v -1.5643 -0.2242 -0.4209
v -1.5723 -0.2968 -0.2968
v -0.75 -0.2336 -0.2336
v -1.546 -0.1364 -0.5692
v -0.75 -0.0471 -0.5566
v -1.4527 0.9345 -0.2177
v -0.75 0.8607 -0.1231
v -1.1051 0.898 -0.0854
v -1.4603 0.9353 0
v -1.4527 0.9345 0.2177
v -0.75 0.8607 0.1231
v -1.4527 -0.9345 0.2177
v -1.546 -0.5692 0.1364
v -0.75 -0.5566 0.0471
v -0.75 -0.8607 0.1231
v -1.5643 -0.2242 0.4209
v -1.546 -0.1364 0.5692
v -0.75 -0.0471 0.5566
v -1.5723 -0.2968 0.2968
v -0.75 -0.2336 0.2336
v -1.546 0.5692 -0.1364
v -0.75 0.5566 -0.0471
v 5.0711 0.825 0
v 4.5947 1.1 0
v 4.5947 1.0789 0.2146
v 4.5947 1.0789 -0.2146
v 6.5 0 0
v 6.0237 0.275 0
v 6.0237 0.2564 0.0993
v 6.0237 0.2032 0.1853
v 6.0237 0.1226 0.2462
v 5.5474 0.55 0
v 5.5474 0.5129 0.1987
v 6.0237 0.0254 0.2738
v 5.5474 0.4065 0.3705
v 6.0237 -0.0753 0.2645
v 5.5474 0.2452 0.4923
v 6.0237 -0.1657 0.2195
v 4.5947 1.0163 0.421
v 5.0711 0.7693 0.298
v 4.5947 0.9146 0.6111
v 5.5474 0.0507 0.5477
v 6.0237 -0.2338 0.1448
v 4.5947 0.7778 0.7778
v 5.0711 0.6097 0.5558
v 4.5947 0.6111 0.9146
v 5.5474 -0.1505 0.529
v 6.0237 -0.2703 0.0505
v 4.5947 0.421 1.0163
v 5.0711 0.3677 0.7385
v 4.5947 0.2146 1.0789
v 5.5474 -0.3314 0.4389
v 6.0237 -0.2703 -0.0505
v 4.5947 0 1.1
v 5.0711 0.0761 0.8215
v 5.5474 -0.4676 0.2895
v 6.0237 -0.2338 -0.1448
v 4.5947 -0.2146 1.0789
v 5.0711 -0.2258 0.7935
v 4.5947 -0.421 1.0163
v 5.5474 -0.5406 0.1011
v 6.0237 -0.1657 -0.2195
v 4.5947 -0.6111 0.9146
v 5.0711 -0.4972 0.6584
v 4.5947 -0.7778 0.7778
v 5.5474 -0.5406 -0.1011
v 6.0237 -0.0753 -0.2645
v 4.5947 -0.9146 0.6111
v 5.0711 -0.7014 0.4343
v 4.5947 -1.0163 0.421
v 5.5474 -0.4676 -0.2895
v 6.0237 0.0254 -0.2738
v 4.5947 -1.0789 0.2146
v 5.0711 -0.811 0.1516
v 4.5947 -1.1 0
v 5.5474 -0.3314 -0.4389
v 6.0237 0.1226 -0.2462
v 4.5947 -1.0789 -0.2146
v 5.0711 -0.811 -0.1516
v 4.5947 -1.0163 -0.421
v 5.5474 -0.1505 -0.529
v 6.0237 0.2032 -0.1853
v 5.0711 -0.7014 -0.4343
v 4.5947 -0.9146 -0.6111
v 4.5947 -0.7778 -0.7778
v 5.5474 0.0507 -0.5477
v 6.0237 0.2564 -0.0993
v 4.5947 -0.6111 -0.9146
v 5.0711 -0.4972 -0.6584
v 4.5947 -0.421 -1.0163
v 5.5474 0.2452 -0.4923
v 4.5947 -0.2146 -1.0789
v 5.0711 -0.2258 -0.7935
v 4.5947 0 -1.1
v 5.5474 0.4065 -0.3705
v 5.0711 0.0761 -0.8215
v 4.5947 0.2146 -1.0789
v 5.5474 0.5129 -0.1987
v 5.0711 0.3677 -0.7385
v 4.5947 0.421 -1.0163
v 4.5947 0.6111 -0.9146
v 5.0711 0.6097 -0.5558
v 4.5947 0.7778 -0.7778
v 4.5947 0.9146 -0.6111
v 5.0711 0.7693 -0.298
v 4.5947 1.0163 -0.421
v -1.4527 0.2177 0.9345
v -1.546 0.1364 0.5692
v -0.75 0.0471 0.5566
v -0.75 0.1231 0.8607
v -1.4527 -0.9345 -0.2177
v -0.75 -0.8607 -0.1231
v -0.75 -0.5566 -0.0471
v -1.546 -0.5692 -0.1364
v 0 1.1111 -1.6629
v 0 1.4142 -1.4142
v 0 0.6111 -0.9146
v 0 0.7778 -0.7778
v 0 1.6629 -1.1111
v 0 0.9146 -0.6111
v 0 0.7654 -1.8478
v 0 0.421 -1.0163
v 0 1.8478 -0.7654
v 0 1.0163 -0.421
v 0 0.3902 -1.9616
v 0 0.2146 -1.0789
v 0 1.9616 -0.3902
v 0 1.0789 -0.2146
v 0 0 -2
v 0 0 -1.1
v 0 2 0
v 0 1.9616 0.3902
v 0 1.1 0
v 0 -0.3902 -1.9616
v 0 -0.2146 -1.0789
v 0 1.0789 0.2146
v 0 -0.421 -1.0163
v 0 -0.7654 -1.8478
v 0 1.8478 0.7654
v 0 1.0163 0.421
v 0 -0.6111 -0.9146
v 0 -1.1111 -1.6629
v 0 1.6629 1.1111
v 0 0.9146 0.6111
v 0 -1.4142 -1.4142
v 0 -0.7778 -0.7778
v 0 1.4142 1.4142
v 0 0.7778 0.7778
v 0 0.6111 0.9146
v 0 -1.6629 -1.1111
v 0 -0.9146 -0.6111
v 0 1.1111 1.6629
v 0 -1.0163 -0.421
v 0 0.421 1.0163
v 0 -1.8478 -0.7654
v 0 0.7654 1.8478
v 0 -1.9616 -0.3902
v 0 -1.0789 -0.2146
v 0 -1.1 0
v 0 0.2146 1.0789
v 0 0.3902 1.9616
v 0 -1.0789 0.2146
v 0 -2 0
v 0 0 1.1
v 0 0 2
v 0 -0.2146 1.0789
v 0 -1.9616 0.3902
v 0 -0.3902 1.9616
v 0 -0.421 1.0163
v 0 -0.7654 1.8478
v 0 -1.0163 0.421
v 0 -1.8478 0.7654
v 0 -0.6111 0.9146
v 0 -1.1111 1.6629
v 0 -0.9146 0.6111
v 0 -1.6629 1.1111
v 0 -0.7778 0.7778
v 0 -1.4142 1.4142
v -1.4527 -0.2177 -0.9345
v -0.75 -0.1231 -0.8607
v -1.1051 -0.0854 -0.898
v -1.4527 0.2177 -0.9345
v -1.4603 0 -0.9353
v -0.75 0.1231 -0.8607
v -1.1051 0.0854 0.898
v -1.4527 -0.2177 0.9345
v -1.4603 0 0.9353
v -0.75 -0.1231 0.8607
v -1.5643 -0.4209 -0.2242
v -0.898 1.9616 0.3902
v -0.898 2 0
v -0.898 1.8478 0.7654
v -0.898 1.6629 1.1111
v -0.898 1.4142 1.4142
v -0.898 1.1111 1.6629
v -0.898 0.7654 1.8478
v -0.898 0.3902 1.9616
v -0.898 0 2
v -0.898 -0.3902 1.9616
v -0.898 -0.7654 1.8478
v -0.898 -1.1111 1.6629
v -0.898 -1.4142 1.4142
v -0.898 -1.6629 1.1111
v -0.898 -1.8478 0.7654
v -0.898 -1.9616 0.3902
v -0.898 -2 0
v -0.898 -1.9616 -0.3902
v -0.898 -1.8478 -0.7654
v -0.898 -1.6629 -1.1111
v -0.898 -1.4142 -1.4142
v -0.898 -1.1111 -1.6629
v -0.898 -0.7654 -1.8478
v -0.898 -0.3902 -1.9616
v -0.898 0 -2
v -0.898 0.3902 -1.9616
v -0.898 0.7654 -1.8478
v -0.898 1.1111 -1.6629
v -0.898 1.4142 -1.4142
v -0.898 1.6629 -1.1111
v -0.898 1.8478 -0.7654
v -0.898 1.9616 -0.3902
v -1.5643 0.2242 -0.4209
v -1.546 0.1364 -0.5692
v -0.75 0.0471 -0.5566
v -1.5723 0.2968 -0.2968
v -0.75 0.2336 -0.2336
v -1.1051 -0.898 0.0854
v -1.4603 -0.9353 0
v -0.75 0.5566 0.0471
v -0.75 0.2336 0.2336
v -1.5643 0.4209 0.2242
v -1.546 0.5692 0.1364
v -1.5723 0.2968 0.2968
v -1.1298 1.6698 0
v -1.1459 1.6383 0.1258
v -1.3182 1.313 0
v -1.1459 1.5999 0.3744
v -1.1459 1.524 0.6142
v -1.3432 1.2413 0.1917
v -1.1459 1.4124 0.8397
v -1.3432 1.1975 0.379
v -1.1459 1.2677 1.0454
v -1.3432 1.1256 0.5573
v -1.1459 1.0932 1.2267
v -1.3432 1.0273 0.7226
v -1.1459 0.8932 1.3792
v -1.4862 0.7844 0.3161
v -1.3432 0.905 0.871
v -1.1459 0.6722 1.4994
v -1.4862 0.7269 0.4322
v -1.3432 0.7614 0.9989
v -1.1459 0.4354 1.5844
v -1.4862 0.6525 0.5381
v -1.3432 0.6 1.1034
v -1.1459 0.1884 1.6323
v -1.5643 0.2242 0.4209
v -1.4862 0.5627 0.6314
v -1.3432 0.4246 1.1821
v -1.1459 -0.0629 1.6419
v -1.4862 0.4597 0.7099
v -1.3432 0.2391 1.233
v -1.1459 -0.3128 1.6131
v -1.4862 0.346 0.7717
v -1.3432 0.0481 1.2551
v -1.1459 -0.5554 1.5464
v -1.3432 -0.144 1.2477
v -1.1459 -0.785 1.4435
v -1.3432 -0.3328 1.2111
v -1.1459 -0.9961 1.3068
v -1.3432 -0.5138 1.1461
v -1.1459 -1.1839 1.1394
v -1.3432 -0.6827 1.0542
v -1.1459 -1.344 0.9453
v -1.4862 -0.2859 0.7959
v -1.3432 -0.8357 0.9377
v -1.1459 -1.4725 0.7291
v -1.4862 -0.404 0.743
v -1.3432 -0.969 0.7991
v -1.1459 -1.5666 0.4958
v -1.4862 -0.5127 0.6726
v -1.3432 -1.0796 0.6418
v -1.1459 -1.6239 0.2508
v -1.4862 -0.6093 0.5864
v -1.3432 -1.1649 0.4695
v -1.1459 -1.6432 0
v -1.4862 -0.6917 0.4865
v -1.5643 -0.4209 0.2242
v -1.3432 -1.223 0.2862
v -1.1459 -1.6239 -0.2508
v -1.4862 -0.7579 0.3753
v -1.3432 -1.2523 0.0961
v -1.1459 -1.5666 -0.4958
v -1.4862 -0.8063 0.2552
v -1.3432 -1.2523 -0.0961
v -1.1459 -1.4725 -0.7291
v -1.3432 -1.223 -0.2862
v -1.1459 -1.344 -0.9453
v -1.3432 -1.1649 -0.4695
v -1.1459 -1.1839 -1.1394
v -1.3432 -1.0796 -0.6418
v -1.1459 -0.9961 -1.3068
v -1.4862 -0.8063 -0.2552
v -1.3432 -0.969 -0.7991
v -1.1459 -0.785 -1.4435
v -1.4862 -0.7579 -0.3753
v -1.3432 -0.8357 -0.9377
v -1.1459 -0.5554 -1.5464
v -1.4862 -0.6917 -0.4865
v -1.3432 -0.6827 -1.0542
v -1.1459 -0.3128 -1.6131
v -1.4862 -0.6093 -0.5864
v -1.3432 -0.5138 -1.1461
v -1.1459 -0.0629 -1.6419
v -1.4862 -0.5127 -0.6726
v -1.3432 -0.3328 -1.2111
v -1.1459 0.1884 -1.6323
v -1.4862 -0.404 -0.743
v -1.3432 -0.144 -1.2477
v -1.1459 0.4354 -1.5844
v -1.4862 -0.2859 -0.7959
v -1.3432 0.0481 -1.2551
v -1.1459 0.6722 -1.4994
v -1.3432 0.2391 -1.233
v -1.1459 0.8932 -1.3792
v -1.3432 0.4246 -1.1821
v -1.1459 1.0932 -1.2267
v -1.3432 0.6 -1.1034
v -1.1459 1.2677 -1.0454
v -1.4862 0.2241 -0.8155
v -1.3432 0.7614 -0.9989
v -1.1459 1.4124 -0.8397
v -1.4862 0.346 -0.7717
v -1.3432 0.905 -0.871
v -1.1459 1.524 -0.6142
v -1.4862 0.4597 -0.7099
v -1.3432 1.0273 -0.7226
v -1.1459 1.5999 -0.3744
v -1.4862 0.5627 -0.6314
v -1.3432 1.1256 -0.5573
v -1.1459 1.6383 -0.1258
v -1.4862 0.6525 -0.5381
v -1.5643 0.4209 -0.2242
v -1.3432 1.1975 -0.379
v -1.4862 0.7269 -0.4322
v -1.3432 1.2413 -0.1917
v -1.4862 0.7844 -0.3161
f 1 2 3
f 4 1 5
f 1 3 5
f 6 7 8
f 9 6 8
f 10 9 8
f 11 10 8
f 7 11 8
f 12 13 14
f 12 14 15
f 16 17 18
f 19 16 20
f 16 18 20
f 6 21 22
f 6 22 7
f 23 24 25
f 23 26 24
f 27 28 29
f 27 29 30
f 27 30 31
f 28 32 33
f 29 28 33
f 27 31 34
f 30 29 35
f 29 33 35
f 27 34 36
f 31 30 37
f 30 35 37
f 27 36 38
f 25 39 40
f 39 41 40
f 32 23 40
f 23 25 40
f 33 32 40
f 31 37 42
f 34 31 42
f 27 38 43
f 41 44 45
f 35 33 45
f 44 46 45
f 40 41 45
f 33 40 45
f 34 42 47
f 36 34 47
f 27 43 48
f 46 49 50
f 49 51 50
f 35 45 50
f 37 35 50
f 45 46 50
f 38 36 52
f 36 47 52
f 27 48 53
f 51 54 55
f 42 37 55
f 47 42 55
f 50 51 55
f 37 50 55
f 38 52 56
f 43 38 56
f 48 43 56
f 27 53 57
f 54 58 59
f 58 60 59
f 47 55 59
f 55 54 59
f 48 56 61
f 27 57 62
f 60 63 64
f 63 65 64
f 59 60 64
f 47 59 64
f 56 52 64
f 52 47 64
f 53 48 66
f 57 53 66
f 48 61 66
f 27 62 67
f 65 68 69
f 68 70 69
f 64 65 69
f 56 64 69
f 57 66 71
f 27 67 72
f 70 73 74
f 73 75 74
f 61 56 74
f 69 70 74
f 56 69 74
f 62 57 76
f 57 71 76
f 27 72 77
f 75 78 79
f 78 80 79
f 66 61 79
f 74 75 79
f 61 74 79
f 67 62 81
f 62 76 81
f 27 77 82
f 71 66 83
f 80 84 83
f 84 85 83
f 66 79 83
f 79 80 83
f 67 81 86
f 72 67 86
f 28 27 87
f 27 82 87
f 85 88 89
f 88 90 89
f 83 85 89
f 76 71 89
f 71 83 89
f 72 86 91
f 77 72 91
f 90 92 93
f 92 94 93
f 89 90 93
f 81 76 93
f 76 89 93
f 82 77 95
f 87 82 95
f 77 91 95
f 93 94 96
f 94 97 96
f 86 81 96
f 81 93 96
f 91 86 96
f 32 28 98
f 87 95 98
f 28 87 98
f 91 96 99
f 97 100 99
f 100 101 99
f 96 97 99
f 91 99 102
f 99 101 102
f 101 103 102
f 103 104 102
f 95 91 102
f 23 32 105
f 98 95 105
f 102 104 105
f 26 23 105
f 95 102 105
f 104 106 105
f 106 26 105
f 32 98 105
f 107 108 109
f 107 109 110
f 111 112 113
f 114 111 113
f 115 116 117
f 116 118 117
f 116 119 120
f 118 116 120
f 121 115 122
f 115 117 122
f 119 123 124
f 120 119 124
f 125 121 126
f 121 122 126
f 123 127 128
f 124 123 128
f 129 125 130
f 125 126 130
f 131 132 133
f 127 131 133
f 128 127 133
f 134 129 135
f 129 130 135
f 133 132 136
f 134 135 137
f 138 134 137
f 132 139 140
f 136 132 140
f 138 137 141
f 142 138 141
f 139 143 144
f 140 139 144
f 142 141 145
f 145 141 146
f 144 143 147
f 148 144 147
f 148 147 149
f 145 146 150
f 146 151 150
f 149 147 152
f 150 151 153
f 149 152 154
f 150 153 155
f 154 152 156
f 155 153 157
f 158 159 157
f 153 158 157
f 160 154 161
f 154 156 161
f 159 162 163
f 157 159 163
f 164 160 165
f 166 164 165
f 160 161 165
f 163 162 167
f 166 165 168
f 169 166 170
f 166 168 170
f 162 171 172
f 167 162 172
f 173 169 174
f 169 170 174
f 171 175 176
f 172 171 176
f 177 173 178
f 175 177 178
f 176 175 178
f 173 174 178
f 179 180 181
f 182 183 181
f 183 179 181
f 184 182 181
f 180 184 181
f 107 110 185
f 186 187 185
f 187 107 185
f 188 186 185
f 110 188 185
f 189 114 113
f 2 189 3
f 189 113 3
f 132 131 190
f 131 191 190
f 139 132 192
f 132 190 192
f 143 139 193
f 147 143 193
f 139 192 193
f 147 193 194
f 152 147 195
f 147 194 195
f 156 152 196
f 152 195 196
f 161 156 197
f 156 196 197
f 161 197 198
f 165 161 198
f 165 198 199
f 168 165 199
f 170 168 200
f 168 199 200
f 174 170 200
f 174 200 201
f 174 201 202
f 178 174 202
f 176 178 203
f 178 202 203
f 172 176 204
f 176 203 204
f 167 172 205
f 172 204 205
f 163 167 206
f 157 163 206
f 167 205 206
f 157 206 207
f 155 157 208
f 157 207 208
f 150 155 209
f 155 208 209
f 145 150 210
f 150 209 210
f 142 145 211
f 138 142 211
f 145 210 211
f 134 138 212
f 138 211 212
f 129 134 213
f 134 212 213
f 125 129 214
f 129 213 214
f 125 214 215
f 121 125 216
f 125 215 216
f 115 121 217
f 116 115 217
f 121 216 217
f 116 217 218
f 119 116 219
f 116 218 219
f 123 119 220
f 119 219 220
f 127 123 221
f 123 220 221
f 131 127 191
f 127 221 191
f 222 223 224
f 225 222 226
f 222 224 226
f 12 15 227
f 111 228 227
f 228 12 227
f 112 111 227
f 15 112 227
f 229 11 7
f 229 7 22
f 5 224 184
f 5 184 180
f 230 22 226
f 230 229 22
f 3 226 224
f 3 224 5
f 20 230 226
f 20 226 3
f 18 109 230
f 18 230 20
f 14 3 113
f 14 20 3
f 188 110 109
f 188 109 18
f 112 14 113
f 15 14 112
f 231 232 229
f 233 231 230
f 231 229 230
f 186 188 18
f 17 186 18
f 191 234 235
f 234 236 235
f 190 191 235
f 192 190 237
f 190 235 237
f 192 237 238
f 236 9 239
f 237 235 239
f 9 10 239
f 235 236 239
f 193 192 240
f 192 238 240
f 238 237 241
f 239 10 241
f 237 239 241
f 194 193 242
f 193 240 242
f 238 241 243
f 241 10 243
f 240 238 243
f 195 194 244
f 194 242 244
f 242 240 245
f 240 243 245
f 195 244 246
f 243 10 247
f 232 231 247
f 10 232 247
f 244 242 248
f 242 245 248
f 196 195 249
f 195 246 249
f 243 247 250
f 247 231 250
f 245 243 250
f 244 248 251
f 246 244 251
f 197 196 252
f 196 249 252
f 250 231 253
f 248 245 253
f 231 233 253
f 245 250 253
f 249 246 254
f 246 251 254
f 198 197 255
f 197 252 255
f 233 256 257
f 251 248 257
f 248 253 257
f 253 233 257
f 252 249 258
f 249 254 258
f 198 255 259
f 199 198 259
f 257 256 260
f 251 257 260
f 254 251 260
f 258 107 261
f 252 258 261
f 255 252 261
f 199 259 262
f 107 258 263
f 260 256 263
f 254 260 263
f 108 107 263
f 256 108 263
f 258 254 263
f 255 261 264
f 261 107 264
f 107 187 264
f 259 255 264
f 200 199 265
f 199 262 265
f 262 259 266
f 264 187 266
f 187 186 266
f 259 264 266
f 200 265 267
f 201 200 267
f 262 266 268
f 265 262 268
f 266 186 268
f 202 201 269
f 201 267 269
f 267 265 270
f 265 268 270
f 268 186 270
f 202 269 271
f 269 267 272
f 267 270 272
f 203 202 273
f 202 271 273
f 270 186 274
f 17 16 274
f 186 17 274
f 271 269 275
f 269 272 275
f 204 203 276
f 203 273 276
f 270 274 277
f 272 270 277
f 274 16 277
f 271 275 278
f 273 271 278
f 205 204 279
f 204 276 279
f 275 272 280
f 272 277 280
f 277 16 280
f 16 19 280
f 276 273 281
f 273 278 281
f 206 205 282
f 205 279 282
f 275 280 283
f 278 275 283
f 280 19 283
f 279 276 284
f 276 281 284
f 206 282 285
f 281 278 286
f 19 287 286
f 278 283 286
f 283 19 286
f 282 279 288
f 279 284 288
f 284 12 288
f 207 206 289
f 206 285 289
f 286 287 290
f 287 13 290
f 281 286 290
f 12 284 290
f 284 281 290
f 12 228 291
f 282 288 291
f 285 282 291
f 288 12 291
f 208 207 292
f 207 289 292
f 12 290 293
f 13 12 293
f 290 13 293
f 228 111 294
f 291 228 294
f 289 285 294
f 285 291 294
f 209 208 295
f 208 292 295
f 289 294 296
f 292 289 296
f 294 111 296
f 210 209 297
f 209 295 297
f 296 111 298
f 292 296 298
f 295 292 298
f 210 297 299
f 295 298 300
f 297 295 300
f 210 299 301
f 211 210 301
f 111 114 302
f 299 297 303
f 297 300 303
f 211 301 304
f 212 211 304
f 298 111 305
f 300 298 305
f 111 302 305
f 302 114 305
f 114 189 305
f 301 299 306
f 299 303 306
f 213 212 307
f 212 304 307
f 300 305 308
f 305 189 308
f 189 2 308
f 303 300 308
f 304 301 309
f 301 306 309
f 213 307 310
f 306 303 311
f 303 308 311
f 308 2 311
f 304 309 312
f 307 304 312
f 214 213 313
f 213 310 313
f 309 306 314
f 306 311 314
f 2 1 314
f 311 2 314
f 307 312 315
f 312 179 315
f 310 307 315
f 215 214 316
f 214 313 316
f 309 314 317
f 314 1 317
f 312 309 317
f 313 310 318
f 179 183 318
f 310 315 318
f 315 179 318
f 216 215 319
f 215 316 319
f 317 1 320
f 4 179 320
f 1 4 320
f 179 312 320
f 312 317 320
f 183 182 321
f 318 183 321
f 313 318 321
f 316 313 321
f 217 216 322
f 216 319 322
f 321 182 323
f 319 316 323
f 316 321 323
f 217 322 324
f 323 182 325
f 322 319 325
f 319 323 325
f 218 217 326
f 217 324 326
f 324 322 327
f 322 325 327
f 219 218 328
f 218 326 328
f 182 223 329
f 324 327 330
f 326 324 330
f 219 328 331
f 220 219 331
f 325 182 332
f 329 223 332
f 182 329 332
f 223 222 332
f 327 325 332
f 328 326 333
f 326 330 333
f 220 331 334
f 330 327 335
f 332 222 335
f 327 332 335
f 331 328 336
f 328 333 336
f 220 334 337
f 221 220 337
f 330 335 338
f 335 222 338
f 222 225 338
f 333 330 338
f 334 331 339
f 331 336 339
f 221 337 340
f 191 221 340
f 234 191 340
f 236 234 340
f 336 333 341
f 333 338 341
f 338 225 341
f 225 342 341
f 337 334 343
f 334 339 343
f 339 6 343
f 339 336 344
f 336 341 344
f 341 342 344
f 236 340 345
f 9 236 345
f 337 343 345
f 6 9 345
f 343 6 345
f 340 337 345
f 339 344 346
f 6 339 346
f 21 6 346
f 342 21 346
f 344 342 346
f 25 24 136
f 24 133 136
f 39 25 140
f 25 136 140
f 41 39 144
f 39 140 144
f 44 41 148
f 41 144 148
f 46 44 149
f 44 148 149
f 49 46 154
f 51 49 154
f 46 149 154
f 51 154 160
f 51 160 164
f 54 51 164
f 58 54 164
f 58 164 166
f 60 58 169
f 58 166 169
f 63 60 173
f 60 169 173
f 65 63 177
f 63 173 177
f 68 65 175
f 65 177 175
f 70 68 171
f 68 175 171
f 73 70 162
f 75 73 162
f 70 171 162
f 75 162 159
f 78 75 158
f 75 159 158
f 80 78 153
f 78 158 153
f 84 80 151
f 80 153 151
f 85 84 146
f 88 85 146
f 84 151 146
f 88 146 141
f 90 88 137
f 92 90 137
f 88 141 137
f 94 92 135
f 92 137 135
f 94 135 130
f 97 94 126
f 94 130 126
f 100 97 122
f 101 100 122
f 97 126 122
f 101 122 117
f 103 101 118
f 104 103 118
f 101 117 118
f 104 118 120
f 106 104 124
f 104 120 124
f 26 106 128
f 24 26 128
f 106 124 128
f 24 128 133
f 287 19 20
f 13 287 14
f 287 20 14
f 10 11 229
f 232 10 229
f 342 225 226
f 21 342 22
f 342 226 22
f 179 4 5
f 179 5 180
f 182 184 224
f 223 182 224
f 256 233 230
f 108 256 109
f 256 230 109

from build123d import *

# Parameters (mm, degrees)
CHAMFER1_SIZE      = 0.22
CHAMFER1_SIZE2     = 0.381051178
CUT_EXTRUDE1_DEPTH = 0.85
CUT_EXTRUDE1_TAPER = 6


with BuildPart() as part:
    # Sketch1 → Revolve1 (revolve)
    with BuildSketch(Plane.XY):
        with BuildLine():
            Line((0, 2), (-0.897999199, 2))
            ThreePointArc((-0.897999199, 2), (-1.419403703, 1.059811908), (-1.6, 0))
            Line((-1.6, 0), (6.5, 0))
            Line((6.5, 0), (6.5, 1.1))
            Line((6.5, 1.1), (0, 1.1))
            Line((0, 1.1), (0, 2))
        make_face()
    revolve(axis=Axis((0, 0, 0), (1, 0, 0)))

    # Chamfer1
    chamfer1_edges = [part.edges().sort_by_distance(p)[0] for p in [
        (6.5, -1.1, 0),
    ]]
    chamfer1_side = [part.faces().sort_by_distance(p)[0] for p in [
        (6.5, 0, 0),
    ]]
    chamfer(chamfer1_edges, length=CHAMFER1_SIZE, length2=CHAMFER1_SIZE2, reference=chamfer1_side[0])

    # Sketch2 → EndCone (revolve, cut)
    with BuildSketch(Plane.XY):
        Polygon((6.5, 0), (4.594744112, 1.1), (4.594744112, 1.2), (6.6, 1.2), (6.6, 0), align=None)
    revolve(axis=Axis((0, 0, 0), (1, 0, 0)), mode=Mode.SUBTRACT)

    # Sketch3 → Cut-Extrude1 (cut)
    with BuildSketch(Plane(origin=(-1.6, 0, 0), x_dir=(0, 0, -1), z_dir=(1, 0, 0))):
        Polygon((-0.2375, 0.95), (-0.1425, 0.57), (-0.29897586, 0.29897586), (-0.57, 0.1425), (-0.95, 0.2375), (-0.95, -0.2375), (-0.57, -0.1425), (-0.29897586, -0.29897586), (-0.1425, -0.57), (-0.2375, -0.95), (0.2375, -0.95), (0.1425, -0.57), (0.29897586, -0.29897586), (0.57, -0.1425), (0.95, -0.2375), (0.95, 0.2375), (0.57, 0.1425), (0.29897586, 0.29897586), (0.1425, 0.57), (0.2375, 0.95), align=None)
    extrude(amount=CUT_EXTRUDE1_DEPTH, taper=CUT_EXTRUDE1_TAPER, mode=Mode.SUBTRACT)


solid = part.part
